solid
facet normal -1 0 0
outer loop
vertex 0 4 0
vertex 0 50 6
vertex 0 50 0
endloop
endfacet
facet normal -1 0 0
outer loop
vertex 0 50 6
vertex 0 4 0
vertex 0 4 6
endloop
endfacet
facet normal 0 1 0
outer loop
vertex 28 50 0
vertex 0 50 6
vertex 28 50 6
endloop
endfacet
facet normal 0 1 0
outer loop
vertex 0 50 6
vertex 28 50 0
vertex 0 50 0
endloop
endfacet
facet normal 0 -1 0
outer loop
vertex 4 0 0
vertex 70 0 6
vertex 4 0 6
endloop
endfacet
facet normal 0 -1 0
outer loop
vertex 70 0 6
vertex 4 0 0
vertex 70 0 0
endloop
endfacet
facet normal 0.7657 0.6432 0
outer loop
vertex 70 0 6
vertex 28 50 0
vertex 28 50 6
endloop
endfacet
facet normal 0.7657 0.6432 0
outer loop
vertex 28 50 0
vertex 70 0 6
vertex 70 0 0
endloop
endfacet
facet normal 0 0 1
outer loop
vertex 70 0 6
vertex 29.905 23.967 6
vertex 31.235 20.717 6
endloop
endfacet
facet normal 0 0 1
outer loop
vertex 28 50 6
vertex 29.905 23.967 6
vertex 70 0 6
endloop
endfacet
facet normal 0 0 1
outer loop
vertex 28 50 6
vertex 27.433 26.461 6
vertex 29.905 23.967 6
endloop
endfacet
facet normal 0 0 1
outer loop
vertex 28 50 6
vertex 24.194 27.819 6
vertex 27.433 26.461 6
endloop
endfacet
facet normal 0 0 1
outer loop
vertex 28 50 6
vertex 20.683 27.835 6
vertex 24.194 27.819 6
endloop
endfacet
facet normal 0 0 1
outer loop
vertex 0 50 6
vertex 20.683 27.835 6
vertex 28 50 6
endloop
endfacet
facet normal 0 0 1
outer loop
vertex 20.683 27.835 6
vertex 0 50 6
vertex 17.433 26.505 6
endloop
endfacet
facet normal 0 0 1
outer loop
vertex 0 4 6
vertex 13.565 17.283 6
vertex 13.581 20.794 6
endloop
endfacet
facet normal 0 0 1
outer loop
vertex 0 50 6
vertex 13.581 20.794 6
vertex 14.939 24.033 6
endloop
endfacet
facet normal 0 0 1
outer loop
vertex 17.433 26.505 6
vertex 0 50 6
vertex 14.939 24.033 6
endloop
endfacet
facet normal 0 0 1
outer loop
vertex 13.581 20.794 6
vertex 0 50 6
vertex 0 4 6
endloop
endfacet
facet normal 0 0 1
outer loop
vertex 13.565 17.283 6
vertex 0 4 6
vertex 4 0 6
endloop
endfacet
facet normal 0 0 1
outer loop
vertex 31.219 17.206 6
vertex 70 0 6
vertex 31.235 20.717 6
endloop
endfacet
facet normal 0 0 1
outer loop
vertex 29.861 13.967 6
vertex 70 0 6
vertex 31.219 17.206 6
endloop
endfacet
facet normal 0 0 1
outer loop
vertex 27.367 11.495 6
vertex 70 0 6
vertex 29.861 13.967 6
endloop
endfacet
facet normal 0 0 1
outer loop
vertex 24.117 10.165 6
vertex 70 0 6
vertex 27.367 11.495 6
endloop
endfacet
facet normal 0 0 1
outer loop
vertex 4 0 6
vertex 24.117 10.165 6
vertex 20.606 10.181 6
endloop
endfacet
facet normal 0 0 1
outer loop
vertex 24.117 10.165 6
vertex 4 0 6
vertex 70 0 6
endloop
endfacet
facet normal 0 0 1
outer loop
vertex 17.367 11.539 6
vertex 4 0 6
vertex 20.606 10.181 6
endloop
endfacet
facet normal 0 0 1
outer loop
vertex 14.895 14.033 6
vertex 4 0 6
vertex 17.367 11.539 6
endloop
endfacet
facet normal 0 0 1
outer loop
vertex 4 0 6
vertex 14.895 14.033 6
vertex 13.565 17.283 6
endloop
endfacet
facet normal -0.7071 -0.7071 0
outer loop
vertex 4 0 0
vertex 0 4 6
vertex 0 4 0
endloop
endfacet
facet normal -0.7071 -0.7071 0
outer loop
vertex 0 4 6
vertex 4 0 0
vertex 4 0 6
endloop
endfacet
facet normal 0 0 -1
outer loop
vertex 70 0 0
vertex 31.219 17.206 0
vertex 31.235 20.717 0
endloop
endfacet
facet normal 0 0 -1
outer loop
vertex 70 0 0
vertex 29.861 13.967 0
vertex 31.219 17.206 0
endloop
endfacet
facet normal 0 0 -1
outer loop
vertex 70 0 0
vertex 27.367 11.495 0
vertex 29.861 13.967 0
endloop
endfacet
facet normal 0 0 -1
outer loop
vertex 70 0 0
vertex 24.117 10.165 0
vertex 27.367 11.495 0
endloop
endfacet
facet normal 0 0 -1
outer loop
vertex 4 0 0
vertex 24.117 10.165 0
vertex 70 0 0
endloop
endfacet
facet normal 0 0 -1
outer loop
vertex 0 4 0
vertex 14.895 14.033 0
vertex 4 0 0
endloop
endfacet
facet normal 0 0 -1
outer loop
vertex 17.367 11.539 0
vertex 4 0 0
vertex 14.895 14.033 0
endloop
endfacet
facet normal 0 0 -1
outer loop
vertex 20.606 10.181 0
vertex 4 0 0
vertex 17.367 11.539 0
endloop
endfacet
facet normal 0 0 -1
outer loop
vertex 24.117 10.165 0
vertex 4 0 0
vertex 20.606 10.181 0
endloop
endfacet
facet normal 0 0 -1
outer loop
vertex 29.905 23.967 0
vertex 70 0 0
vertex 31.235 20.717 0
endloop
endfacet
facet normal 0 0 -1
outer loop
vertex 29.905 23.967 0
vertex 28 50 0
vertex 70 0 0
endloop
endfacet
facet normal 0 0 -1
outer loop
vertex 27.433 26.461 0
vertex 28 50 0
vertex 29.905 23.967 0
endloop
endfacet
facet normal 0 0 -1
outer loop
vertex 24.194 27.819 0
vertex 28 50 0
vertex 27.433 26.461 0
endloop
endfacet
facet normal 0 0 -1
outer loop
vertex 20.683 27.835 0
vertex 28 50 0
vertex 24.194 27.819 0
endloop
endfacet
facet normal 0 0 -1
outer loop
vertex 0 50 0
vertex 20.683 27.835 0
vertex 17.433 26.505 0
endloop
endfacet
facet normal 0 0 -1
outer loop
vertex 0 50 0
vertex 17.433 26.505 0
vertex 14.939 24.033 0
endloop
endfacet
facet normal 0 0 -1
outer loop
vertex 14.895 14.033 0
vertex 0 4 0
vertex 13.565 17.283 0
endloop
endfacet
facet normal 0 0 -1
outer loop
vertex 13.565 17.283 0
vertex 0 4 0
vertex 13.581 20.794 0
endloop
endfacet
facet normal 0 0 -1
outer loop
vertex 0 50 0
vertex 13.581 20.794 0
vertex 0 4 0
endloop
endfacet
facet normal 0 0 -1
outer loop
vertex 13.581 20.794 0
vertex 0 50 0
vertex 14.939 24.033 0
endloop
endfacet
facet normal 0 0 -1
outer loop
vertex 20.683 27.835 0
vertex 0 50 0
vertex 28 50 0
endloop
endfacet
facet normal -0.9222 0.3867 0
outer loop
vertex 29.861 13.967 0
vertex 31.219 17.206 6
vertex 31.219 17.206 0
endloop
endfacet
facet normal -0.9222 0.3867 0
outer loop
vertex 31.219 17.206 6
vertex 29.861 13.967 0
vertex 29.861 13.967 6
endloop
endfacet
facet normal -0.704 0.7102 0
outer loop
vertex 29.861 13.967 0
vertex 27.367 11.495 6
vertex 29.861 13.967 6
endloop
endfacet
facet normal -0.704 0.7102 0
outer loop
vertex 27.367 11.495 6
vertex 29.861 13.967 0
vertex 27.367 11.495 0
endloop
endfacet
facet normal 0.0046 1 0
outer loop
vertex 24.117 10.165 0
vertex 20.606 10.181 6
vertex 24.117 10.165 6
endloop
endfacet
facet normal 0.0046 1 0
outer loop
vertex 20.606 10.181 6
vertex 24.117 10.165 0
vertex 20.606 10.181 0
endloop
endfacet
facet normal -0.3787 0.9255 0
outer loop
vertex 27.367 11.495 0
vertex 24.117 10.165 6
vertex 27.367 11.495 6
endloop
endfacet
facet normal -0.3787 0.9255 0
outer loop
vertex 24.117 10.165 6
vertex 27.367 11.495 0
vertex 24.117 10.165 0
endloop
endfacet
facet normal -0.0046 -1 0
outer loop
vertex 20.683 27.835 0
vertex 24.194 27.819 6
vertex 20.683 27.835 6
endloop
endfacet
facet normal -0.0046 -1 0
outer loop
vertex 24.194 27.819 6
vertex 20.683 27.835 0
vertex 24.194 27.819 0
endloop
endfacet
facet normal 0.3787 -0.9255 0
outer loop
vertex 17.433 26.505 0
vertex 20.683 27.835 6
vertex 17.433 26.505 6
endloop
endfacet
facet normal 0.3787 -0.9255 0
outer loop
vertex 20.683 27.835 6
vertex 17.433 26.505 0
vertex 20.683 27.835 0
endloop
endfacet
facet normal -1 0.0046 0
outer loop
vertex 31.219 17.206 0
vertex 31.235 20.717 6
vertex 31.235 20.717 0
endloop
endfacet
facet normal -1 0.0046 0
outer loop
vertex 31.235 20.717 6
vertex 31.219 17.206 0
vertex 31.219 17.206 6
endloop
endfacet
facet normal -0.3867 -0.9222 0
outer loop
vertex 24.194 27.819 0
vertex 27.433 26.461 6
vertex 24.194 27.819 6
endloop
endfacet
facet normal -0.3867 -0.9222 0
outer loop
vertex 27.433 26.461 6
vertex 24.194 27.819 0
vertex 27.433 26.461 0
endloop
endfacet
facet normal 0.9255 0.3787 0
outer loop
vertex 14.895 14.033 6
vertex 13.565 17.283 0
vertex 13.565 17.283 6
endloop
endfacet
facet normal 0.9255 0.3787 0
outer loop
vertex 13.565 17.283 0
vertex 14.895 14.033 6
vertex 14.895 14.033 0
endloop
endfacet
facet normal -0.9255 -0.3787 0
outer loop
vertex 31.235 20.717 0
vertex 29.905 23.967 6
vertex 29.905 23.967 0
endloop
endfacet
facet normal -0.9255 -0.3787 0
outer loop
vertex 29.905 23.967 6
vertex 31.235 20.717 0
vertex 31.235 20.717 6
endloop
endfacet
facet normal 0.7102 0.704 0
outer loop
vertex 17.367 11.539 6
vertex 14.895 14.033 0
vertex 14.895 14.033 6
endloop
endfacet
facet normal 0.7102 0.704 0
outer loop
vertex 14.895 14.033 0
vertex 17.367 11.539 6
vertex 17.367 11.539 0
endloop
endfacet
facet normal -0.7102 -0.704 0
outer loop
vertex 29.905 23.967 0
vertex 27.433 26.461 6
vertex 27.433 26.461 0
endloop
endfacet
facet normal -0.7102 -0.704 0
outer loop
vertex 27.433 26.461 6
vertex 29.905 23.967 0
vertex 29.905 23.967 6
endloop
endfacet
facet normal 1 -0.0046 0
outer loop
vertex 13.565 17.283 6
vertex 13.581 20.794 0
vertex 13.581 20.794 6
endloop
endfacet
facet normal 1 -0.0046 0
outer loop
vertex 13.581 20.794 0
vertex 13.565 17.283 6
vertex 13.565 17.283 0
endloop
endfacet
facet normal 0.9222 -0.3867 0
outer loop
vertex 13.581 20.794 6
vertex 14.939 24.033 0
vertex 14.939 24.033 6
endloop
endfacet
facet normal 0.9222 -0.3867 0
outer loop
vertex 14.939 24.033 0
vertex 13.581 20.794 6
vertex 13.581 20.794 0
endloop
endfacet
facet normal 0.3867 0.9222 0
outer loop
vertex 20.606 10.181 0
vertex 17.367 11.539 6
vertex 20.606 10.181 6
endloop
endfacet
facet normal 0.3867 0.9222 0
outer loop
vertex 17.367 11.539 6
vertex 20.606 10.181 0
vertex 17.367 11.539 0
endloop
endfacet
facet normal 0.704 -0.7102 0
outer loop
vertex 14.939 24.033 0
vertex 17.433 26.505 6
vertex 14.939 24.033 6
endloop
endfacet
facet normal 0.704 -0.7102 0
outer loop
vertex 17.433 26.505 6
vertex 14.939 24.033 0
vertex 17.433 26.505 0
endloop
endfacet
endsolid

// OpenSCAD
$fn = 32;

// ----------------------------------------------------------------------
// Bracket plate: gusset 70 x 50
// ----------------------------------------------------------------------

// --- parameters (mm) ---
hole_r = 3;               // bolt hole radius
plate_t = 6;              // plate thickness, Z (extrusion height)
gus_a = 70;               // base length
gus_b = 50;               // height
top_x = 28;               // top edge X of the angled cut
light_r = 9;              // lightening hole radius
fit_tol = 0.05;           // declared fit tolerance (prompt contract)
free_tol = 0.3;           // declared free tolerance (prompt contract)

light_d = 2 * light_r;

profile = [[4, 0], [35, 0], [70, 0], [28, 50], [0, 50], [0, 4]];  // primary outline, 6 points, counter clockwise
void_1 = [[31.235, 20.717], [29.905, 23.967], [27.433, 26.461], [24.194, 27.819], [20.683, 27.835], [17.433, 26.505], [14.939, 24.033], [13.581, 20.794], [13.565, 17.283], [14.895, 14.033], [17.367, 11.539], [20.606, 10.181], [24.117, 10.165], [27.367, 11.495], [29.861, 13.967], [31.219, 17.206]];  // lightening hole, 16 points

// --- the one profile operation ---
difference() {
  linear_extrude(height = plate_t) polygon(points = profile);
  translate([0, 0, -1])
    linear_extrude(height = plate_t + 2) polygon(points = void_1);
}
